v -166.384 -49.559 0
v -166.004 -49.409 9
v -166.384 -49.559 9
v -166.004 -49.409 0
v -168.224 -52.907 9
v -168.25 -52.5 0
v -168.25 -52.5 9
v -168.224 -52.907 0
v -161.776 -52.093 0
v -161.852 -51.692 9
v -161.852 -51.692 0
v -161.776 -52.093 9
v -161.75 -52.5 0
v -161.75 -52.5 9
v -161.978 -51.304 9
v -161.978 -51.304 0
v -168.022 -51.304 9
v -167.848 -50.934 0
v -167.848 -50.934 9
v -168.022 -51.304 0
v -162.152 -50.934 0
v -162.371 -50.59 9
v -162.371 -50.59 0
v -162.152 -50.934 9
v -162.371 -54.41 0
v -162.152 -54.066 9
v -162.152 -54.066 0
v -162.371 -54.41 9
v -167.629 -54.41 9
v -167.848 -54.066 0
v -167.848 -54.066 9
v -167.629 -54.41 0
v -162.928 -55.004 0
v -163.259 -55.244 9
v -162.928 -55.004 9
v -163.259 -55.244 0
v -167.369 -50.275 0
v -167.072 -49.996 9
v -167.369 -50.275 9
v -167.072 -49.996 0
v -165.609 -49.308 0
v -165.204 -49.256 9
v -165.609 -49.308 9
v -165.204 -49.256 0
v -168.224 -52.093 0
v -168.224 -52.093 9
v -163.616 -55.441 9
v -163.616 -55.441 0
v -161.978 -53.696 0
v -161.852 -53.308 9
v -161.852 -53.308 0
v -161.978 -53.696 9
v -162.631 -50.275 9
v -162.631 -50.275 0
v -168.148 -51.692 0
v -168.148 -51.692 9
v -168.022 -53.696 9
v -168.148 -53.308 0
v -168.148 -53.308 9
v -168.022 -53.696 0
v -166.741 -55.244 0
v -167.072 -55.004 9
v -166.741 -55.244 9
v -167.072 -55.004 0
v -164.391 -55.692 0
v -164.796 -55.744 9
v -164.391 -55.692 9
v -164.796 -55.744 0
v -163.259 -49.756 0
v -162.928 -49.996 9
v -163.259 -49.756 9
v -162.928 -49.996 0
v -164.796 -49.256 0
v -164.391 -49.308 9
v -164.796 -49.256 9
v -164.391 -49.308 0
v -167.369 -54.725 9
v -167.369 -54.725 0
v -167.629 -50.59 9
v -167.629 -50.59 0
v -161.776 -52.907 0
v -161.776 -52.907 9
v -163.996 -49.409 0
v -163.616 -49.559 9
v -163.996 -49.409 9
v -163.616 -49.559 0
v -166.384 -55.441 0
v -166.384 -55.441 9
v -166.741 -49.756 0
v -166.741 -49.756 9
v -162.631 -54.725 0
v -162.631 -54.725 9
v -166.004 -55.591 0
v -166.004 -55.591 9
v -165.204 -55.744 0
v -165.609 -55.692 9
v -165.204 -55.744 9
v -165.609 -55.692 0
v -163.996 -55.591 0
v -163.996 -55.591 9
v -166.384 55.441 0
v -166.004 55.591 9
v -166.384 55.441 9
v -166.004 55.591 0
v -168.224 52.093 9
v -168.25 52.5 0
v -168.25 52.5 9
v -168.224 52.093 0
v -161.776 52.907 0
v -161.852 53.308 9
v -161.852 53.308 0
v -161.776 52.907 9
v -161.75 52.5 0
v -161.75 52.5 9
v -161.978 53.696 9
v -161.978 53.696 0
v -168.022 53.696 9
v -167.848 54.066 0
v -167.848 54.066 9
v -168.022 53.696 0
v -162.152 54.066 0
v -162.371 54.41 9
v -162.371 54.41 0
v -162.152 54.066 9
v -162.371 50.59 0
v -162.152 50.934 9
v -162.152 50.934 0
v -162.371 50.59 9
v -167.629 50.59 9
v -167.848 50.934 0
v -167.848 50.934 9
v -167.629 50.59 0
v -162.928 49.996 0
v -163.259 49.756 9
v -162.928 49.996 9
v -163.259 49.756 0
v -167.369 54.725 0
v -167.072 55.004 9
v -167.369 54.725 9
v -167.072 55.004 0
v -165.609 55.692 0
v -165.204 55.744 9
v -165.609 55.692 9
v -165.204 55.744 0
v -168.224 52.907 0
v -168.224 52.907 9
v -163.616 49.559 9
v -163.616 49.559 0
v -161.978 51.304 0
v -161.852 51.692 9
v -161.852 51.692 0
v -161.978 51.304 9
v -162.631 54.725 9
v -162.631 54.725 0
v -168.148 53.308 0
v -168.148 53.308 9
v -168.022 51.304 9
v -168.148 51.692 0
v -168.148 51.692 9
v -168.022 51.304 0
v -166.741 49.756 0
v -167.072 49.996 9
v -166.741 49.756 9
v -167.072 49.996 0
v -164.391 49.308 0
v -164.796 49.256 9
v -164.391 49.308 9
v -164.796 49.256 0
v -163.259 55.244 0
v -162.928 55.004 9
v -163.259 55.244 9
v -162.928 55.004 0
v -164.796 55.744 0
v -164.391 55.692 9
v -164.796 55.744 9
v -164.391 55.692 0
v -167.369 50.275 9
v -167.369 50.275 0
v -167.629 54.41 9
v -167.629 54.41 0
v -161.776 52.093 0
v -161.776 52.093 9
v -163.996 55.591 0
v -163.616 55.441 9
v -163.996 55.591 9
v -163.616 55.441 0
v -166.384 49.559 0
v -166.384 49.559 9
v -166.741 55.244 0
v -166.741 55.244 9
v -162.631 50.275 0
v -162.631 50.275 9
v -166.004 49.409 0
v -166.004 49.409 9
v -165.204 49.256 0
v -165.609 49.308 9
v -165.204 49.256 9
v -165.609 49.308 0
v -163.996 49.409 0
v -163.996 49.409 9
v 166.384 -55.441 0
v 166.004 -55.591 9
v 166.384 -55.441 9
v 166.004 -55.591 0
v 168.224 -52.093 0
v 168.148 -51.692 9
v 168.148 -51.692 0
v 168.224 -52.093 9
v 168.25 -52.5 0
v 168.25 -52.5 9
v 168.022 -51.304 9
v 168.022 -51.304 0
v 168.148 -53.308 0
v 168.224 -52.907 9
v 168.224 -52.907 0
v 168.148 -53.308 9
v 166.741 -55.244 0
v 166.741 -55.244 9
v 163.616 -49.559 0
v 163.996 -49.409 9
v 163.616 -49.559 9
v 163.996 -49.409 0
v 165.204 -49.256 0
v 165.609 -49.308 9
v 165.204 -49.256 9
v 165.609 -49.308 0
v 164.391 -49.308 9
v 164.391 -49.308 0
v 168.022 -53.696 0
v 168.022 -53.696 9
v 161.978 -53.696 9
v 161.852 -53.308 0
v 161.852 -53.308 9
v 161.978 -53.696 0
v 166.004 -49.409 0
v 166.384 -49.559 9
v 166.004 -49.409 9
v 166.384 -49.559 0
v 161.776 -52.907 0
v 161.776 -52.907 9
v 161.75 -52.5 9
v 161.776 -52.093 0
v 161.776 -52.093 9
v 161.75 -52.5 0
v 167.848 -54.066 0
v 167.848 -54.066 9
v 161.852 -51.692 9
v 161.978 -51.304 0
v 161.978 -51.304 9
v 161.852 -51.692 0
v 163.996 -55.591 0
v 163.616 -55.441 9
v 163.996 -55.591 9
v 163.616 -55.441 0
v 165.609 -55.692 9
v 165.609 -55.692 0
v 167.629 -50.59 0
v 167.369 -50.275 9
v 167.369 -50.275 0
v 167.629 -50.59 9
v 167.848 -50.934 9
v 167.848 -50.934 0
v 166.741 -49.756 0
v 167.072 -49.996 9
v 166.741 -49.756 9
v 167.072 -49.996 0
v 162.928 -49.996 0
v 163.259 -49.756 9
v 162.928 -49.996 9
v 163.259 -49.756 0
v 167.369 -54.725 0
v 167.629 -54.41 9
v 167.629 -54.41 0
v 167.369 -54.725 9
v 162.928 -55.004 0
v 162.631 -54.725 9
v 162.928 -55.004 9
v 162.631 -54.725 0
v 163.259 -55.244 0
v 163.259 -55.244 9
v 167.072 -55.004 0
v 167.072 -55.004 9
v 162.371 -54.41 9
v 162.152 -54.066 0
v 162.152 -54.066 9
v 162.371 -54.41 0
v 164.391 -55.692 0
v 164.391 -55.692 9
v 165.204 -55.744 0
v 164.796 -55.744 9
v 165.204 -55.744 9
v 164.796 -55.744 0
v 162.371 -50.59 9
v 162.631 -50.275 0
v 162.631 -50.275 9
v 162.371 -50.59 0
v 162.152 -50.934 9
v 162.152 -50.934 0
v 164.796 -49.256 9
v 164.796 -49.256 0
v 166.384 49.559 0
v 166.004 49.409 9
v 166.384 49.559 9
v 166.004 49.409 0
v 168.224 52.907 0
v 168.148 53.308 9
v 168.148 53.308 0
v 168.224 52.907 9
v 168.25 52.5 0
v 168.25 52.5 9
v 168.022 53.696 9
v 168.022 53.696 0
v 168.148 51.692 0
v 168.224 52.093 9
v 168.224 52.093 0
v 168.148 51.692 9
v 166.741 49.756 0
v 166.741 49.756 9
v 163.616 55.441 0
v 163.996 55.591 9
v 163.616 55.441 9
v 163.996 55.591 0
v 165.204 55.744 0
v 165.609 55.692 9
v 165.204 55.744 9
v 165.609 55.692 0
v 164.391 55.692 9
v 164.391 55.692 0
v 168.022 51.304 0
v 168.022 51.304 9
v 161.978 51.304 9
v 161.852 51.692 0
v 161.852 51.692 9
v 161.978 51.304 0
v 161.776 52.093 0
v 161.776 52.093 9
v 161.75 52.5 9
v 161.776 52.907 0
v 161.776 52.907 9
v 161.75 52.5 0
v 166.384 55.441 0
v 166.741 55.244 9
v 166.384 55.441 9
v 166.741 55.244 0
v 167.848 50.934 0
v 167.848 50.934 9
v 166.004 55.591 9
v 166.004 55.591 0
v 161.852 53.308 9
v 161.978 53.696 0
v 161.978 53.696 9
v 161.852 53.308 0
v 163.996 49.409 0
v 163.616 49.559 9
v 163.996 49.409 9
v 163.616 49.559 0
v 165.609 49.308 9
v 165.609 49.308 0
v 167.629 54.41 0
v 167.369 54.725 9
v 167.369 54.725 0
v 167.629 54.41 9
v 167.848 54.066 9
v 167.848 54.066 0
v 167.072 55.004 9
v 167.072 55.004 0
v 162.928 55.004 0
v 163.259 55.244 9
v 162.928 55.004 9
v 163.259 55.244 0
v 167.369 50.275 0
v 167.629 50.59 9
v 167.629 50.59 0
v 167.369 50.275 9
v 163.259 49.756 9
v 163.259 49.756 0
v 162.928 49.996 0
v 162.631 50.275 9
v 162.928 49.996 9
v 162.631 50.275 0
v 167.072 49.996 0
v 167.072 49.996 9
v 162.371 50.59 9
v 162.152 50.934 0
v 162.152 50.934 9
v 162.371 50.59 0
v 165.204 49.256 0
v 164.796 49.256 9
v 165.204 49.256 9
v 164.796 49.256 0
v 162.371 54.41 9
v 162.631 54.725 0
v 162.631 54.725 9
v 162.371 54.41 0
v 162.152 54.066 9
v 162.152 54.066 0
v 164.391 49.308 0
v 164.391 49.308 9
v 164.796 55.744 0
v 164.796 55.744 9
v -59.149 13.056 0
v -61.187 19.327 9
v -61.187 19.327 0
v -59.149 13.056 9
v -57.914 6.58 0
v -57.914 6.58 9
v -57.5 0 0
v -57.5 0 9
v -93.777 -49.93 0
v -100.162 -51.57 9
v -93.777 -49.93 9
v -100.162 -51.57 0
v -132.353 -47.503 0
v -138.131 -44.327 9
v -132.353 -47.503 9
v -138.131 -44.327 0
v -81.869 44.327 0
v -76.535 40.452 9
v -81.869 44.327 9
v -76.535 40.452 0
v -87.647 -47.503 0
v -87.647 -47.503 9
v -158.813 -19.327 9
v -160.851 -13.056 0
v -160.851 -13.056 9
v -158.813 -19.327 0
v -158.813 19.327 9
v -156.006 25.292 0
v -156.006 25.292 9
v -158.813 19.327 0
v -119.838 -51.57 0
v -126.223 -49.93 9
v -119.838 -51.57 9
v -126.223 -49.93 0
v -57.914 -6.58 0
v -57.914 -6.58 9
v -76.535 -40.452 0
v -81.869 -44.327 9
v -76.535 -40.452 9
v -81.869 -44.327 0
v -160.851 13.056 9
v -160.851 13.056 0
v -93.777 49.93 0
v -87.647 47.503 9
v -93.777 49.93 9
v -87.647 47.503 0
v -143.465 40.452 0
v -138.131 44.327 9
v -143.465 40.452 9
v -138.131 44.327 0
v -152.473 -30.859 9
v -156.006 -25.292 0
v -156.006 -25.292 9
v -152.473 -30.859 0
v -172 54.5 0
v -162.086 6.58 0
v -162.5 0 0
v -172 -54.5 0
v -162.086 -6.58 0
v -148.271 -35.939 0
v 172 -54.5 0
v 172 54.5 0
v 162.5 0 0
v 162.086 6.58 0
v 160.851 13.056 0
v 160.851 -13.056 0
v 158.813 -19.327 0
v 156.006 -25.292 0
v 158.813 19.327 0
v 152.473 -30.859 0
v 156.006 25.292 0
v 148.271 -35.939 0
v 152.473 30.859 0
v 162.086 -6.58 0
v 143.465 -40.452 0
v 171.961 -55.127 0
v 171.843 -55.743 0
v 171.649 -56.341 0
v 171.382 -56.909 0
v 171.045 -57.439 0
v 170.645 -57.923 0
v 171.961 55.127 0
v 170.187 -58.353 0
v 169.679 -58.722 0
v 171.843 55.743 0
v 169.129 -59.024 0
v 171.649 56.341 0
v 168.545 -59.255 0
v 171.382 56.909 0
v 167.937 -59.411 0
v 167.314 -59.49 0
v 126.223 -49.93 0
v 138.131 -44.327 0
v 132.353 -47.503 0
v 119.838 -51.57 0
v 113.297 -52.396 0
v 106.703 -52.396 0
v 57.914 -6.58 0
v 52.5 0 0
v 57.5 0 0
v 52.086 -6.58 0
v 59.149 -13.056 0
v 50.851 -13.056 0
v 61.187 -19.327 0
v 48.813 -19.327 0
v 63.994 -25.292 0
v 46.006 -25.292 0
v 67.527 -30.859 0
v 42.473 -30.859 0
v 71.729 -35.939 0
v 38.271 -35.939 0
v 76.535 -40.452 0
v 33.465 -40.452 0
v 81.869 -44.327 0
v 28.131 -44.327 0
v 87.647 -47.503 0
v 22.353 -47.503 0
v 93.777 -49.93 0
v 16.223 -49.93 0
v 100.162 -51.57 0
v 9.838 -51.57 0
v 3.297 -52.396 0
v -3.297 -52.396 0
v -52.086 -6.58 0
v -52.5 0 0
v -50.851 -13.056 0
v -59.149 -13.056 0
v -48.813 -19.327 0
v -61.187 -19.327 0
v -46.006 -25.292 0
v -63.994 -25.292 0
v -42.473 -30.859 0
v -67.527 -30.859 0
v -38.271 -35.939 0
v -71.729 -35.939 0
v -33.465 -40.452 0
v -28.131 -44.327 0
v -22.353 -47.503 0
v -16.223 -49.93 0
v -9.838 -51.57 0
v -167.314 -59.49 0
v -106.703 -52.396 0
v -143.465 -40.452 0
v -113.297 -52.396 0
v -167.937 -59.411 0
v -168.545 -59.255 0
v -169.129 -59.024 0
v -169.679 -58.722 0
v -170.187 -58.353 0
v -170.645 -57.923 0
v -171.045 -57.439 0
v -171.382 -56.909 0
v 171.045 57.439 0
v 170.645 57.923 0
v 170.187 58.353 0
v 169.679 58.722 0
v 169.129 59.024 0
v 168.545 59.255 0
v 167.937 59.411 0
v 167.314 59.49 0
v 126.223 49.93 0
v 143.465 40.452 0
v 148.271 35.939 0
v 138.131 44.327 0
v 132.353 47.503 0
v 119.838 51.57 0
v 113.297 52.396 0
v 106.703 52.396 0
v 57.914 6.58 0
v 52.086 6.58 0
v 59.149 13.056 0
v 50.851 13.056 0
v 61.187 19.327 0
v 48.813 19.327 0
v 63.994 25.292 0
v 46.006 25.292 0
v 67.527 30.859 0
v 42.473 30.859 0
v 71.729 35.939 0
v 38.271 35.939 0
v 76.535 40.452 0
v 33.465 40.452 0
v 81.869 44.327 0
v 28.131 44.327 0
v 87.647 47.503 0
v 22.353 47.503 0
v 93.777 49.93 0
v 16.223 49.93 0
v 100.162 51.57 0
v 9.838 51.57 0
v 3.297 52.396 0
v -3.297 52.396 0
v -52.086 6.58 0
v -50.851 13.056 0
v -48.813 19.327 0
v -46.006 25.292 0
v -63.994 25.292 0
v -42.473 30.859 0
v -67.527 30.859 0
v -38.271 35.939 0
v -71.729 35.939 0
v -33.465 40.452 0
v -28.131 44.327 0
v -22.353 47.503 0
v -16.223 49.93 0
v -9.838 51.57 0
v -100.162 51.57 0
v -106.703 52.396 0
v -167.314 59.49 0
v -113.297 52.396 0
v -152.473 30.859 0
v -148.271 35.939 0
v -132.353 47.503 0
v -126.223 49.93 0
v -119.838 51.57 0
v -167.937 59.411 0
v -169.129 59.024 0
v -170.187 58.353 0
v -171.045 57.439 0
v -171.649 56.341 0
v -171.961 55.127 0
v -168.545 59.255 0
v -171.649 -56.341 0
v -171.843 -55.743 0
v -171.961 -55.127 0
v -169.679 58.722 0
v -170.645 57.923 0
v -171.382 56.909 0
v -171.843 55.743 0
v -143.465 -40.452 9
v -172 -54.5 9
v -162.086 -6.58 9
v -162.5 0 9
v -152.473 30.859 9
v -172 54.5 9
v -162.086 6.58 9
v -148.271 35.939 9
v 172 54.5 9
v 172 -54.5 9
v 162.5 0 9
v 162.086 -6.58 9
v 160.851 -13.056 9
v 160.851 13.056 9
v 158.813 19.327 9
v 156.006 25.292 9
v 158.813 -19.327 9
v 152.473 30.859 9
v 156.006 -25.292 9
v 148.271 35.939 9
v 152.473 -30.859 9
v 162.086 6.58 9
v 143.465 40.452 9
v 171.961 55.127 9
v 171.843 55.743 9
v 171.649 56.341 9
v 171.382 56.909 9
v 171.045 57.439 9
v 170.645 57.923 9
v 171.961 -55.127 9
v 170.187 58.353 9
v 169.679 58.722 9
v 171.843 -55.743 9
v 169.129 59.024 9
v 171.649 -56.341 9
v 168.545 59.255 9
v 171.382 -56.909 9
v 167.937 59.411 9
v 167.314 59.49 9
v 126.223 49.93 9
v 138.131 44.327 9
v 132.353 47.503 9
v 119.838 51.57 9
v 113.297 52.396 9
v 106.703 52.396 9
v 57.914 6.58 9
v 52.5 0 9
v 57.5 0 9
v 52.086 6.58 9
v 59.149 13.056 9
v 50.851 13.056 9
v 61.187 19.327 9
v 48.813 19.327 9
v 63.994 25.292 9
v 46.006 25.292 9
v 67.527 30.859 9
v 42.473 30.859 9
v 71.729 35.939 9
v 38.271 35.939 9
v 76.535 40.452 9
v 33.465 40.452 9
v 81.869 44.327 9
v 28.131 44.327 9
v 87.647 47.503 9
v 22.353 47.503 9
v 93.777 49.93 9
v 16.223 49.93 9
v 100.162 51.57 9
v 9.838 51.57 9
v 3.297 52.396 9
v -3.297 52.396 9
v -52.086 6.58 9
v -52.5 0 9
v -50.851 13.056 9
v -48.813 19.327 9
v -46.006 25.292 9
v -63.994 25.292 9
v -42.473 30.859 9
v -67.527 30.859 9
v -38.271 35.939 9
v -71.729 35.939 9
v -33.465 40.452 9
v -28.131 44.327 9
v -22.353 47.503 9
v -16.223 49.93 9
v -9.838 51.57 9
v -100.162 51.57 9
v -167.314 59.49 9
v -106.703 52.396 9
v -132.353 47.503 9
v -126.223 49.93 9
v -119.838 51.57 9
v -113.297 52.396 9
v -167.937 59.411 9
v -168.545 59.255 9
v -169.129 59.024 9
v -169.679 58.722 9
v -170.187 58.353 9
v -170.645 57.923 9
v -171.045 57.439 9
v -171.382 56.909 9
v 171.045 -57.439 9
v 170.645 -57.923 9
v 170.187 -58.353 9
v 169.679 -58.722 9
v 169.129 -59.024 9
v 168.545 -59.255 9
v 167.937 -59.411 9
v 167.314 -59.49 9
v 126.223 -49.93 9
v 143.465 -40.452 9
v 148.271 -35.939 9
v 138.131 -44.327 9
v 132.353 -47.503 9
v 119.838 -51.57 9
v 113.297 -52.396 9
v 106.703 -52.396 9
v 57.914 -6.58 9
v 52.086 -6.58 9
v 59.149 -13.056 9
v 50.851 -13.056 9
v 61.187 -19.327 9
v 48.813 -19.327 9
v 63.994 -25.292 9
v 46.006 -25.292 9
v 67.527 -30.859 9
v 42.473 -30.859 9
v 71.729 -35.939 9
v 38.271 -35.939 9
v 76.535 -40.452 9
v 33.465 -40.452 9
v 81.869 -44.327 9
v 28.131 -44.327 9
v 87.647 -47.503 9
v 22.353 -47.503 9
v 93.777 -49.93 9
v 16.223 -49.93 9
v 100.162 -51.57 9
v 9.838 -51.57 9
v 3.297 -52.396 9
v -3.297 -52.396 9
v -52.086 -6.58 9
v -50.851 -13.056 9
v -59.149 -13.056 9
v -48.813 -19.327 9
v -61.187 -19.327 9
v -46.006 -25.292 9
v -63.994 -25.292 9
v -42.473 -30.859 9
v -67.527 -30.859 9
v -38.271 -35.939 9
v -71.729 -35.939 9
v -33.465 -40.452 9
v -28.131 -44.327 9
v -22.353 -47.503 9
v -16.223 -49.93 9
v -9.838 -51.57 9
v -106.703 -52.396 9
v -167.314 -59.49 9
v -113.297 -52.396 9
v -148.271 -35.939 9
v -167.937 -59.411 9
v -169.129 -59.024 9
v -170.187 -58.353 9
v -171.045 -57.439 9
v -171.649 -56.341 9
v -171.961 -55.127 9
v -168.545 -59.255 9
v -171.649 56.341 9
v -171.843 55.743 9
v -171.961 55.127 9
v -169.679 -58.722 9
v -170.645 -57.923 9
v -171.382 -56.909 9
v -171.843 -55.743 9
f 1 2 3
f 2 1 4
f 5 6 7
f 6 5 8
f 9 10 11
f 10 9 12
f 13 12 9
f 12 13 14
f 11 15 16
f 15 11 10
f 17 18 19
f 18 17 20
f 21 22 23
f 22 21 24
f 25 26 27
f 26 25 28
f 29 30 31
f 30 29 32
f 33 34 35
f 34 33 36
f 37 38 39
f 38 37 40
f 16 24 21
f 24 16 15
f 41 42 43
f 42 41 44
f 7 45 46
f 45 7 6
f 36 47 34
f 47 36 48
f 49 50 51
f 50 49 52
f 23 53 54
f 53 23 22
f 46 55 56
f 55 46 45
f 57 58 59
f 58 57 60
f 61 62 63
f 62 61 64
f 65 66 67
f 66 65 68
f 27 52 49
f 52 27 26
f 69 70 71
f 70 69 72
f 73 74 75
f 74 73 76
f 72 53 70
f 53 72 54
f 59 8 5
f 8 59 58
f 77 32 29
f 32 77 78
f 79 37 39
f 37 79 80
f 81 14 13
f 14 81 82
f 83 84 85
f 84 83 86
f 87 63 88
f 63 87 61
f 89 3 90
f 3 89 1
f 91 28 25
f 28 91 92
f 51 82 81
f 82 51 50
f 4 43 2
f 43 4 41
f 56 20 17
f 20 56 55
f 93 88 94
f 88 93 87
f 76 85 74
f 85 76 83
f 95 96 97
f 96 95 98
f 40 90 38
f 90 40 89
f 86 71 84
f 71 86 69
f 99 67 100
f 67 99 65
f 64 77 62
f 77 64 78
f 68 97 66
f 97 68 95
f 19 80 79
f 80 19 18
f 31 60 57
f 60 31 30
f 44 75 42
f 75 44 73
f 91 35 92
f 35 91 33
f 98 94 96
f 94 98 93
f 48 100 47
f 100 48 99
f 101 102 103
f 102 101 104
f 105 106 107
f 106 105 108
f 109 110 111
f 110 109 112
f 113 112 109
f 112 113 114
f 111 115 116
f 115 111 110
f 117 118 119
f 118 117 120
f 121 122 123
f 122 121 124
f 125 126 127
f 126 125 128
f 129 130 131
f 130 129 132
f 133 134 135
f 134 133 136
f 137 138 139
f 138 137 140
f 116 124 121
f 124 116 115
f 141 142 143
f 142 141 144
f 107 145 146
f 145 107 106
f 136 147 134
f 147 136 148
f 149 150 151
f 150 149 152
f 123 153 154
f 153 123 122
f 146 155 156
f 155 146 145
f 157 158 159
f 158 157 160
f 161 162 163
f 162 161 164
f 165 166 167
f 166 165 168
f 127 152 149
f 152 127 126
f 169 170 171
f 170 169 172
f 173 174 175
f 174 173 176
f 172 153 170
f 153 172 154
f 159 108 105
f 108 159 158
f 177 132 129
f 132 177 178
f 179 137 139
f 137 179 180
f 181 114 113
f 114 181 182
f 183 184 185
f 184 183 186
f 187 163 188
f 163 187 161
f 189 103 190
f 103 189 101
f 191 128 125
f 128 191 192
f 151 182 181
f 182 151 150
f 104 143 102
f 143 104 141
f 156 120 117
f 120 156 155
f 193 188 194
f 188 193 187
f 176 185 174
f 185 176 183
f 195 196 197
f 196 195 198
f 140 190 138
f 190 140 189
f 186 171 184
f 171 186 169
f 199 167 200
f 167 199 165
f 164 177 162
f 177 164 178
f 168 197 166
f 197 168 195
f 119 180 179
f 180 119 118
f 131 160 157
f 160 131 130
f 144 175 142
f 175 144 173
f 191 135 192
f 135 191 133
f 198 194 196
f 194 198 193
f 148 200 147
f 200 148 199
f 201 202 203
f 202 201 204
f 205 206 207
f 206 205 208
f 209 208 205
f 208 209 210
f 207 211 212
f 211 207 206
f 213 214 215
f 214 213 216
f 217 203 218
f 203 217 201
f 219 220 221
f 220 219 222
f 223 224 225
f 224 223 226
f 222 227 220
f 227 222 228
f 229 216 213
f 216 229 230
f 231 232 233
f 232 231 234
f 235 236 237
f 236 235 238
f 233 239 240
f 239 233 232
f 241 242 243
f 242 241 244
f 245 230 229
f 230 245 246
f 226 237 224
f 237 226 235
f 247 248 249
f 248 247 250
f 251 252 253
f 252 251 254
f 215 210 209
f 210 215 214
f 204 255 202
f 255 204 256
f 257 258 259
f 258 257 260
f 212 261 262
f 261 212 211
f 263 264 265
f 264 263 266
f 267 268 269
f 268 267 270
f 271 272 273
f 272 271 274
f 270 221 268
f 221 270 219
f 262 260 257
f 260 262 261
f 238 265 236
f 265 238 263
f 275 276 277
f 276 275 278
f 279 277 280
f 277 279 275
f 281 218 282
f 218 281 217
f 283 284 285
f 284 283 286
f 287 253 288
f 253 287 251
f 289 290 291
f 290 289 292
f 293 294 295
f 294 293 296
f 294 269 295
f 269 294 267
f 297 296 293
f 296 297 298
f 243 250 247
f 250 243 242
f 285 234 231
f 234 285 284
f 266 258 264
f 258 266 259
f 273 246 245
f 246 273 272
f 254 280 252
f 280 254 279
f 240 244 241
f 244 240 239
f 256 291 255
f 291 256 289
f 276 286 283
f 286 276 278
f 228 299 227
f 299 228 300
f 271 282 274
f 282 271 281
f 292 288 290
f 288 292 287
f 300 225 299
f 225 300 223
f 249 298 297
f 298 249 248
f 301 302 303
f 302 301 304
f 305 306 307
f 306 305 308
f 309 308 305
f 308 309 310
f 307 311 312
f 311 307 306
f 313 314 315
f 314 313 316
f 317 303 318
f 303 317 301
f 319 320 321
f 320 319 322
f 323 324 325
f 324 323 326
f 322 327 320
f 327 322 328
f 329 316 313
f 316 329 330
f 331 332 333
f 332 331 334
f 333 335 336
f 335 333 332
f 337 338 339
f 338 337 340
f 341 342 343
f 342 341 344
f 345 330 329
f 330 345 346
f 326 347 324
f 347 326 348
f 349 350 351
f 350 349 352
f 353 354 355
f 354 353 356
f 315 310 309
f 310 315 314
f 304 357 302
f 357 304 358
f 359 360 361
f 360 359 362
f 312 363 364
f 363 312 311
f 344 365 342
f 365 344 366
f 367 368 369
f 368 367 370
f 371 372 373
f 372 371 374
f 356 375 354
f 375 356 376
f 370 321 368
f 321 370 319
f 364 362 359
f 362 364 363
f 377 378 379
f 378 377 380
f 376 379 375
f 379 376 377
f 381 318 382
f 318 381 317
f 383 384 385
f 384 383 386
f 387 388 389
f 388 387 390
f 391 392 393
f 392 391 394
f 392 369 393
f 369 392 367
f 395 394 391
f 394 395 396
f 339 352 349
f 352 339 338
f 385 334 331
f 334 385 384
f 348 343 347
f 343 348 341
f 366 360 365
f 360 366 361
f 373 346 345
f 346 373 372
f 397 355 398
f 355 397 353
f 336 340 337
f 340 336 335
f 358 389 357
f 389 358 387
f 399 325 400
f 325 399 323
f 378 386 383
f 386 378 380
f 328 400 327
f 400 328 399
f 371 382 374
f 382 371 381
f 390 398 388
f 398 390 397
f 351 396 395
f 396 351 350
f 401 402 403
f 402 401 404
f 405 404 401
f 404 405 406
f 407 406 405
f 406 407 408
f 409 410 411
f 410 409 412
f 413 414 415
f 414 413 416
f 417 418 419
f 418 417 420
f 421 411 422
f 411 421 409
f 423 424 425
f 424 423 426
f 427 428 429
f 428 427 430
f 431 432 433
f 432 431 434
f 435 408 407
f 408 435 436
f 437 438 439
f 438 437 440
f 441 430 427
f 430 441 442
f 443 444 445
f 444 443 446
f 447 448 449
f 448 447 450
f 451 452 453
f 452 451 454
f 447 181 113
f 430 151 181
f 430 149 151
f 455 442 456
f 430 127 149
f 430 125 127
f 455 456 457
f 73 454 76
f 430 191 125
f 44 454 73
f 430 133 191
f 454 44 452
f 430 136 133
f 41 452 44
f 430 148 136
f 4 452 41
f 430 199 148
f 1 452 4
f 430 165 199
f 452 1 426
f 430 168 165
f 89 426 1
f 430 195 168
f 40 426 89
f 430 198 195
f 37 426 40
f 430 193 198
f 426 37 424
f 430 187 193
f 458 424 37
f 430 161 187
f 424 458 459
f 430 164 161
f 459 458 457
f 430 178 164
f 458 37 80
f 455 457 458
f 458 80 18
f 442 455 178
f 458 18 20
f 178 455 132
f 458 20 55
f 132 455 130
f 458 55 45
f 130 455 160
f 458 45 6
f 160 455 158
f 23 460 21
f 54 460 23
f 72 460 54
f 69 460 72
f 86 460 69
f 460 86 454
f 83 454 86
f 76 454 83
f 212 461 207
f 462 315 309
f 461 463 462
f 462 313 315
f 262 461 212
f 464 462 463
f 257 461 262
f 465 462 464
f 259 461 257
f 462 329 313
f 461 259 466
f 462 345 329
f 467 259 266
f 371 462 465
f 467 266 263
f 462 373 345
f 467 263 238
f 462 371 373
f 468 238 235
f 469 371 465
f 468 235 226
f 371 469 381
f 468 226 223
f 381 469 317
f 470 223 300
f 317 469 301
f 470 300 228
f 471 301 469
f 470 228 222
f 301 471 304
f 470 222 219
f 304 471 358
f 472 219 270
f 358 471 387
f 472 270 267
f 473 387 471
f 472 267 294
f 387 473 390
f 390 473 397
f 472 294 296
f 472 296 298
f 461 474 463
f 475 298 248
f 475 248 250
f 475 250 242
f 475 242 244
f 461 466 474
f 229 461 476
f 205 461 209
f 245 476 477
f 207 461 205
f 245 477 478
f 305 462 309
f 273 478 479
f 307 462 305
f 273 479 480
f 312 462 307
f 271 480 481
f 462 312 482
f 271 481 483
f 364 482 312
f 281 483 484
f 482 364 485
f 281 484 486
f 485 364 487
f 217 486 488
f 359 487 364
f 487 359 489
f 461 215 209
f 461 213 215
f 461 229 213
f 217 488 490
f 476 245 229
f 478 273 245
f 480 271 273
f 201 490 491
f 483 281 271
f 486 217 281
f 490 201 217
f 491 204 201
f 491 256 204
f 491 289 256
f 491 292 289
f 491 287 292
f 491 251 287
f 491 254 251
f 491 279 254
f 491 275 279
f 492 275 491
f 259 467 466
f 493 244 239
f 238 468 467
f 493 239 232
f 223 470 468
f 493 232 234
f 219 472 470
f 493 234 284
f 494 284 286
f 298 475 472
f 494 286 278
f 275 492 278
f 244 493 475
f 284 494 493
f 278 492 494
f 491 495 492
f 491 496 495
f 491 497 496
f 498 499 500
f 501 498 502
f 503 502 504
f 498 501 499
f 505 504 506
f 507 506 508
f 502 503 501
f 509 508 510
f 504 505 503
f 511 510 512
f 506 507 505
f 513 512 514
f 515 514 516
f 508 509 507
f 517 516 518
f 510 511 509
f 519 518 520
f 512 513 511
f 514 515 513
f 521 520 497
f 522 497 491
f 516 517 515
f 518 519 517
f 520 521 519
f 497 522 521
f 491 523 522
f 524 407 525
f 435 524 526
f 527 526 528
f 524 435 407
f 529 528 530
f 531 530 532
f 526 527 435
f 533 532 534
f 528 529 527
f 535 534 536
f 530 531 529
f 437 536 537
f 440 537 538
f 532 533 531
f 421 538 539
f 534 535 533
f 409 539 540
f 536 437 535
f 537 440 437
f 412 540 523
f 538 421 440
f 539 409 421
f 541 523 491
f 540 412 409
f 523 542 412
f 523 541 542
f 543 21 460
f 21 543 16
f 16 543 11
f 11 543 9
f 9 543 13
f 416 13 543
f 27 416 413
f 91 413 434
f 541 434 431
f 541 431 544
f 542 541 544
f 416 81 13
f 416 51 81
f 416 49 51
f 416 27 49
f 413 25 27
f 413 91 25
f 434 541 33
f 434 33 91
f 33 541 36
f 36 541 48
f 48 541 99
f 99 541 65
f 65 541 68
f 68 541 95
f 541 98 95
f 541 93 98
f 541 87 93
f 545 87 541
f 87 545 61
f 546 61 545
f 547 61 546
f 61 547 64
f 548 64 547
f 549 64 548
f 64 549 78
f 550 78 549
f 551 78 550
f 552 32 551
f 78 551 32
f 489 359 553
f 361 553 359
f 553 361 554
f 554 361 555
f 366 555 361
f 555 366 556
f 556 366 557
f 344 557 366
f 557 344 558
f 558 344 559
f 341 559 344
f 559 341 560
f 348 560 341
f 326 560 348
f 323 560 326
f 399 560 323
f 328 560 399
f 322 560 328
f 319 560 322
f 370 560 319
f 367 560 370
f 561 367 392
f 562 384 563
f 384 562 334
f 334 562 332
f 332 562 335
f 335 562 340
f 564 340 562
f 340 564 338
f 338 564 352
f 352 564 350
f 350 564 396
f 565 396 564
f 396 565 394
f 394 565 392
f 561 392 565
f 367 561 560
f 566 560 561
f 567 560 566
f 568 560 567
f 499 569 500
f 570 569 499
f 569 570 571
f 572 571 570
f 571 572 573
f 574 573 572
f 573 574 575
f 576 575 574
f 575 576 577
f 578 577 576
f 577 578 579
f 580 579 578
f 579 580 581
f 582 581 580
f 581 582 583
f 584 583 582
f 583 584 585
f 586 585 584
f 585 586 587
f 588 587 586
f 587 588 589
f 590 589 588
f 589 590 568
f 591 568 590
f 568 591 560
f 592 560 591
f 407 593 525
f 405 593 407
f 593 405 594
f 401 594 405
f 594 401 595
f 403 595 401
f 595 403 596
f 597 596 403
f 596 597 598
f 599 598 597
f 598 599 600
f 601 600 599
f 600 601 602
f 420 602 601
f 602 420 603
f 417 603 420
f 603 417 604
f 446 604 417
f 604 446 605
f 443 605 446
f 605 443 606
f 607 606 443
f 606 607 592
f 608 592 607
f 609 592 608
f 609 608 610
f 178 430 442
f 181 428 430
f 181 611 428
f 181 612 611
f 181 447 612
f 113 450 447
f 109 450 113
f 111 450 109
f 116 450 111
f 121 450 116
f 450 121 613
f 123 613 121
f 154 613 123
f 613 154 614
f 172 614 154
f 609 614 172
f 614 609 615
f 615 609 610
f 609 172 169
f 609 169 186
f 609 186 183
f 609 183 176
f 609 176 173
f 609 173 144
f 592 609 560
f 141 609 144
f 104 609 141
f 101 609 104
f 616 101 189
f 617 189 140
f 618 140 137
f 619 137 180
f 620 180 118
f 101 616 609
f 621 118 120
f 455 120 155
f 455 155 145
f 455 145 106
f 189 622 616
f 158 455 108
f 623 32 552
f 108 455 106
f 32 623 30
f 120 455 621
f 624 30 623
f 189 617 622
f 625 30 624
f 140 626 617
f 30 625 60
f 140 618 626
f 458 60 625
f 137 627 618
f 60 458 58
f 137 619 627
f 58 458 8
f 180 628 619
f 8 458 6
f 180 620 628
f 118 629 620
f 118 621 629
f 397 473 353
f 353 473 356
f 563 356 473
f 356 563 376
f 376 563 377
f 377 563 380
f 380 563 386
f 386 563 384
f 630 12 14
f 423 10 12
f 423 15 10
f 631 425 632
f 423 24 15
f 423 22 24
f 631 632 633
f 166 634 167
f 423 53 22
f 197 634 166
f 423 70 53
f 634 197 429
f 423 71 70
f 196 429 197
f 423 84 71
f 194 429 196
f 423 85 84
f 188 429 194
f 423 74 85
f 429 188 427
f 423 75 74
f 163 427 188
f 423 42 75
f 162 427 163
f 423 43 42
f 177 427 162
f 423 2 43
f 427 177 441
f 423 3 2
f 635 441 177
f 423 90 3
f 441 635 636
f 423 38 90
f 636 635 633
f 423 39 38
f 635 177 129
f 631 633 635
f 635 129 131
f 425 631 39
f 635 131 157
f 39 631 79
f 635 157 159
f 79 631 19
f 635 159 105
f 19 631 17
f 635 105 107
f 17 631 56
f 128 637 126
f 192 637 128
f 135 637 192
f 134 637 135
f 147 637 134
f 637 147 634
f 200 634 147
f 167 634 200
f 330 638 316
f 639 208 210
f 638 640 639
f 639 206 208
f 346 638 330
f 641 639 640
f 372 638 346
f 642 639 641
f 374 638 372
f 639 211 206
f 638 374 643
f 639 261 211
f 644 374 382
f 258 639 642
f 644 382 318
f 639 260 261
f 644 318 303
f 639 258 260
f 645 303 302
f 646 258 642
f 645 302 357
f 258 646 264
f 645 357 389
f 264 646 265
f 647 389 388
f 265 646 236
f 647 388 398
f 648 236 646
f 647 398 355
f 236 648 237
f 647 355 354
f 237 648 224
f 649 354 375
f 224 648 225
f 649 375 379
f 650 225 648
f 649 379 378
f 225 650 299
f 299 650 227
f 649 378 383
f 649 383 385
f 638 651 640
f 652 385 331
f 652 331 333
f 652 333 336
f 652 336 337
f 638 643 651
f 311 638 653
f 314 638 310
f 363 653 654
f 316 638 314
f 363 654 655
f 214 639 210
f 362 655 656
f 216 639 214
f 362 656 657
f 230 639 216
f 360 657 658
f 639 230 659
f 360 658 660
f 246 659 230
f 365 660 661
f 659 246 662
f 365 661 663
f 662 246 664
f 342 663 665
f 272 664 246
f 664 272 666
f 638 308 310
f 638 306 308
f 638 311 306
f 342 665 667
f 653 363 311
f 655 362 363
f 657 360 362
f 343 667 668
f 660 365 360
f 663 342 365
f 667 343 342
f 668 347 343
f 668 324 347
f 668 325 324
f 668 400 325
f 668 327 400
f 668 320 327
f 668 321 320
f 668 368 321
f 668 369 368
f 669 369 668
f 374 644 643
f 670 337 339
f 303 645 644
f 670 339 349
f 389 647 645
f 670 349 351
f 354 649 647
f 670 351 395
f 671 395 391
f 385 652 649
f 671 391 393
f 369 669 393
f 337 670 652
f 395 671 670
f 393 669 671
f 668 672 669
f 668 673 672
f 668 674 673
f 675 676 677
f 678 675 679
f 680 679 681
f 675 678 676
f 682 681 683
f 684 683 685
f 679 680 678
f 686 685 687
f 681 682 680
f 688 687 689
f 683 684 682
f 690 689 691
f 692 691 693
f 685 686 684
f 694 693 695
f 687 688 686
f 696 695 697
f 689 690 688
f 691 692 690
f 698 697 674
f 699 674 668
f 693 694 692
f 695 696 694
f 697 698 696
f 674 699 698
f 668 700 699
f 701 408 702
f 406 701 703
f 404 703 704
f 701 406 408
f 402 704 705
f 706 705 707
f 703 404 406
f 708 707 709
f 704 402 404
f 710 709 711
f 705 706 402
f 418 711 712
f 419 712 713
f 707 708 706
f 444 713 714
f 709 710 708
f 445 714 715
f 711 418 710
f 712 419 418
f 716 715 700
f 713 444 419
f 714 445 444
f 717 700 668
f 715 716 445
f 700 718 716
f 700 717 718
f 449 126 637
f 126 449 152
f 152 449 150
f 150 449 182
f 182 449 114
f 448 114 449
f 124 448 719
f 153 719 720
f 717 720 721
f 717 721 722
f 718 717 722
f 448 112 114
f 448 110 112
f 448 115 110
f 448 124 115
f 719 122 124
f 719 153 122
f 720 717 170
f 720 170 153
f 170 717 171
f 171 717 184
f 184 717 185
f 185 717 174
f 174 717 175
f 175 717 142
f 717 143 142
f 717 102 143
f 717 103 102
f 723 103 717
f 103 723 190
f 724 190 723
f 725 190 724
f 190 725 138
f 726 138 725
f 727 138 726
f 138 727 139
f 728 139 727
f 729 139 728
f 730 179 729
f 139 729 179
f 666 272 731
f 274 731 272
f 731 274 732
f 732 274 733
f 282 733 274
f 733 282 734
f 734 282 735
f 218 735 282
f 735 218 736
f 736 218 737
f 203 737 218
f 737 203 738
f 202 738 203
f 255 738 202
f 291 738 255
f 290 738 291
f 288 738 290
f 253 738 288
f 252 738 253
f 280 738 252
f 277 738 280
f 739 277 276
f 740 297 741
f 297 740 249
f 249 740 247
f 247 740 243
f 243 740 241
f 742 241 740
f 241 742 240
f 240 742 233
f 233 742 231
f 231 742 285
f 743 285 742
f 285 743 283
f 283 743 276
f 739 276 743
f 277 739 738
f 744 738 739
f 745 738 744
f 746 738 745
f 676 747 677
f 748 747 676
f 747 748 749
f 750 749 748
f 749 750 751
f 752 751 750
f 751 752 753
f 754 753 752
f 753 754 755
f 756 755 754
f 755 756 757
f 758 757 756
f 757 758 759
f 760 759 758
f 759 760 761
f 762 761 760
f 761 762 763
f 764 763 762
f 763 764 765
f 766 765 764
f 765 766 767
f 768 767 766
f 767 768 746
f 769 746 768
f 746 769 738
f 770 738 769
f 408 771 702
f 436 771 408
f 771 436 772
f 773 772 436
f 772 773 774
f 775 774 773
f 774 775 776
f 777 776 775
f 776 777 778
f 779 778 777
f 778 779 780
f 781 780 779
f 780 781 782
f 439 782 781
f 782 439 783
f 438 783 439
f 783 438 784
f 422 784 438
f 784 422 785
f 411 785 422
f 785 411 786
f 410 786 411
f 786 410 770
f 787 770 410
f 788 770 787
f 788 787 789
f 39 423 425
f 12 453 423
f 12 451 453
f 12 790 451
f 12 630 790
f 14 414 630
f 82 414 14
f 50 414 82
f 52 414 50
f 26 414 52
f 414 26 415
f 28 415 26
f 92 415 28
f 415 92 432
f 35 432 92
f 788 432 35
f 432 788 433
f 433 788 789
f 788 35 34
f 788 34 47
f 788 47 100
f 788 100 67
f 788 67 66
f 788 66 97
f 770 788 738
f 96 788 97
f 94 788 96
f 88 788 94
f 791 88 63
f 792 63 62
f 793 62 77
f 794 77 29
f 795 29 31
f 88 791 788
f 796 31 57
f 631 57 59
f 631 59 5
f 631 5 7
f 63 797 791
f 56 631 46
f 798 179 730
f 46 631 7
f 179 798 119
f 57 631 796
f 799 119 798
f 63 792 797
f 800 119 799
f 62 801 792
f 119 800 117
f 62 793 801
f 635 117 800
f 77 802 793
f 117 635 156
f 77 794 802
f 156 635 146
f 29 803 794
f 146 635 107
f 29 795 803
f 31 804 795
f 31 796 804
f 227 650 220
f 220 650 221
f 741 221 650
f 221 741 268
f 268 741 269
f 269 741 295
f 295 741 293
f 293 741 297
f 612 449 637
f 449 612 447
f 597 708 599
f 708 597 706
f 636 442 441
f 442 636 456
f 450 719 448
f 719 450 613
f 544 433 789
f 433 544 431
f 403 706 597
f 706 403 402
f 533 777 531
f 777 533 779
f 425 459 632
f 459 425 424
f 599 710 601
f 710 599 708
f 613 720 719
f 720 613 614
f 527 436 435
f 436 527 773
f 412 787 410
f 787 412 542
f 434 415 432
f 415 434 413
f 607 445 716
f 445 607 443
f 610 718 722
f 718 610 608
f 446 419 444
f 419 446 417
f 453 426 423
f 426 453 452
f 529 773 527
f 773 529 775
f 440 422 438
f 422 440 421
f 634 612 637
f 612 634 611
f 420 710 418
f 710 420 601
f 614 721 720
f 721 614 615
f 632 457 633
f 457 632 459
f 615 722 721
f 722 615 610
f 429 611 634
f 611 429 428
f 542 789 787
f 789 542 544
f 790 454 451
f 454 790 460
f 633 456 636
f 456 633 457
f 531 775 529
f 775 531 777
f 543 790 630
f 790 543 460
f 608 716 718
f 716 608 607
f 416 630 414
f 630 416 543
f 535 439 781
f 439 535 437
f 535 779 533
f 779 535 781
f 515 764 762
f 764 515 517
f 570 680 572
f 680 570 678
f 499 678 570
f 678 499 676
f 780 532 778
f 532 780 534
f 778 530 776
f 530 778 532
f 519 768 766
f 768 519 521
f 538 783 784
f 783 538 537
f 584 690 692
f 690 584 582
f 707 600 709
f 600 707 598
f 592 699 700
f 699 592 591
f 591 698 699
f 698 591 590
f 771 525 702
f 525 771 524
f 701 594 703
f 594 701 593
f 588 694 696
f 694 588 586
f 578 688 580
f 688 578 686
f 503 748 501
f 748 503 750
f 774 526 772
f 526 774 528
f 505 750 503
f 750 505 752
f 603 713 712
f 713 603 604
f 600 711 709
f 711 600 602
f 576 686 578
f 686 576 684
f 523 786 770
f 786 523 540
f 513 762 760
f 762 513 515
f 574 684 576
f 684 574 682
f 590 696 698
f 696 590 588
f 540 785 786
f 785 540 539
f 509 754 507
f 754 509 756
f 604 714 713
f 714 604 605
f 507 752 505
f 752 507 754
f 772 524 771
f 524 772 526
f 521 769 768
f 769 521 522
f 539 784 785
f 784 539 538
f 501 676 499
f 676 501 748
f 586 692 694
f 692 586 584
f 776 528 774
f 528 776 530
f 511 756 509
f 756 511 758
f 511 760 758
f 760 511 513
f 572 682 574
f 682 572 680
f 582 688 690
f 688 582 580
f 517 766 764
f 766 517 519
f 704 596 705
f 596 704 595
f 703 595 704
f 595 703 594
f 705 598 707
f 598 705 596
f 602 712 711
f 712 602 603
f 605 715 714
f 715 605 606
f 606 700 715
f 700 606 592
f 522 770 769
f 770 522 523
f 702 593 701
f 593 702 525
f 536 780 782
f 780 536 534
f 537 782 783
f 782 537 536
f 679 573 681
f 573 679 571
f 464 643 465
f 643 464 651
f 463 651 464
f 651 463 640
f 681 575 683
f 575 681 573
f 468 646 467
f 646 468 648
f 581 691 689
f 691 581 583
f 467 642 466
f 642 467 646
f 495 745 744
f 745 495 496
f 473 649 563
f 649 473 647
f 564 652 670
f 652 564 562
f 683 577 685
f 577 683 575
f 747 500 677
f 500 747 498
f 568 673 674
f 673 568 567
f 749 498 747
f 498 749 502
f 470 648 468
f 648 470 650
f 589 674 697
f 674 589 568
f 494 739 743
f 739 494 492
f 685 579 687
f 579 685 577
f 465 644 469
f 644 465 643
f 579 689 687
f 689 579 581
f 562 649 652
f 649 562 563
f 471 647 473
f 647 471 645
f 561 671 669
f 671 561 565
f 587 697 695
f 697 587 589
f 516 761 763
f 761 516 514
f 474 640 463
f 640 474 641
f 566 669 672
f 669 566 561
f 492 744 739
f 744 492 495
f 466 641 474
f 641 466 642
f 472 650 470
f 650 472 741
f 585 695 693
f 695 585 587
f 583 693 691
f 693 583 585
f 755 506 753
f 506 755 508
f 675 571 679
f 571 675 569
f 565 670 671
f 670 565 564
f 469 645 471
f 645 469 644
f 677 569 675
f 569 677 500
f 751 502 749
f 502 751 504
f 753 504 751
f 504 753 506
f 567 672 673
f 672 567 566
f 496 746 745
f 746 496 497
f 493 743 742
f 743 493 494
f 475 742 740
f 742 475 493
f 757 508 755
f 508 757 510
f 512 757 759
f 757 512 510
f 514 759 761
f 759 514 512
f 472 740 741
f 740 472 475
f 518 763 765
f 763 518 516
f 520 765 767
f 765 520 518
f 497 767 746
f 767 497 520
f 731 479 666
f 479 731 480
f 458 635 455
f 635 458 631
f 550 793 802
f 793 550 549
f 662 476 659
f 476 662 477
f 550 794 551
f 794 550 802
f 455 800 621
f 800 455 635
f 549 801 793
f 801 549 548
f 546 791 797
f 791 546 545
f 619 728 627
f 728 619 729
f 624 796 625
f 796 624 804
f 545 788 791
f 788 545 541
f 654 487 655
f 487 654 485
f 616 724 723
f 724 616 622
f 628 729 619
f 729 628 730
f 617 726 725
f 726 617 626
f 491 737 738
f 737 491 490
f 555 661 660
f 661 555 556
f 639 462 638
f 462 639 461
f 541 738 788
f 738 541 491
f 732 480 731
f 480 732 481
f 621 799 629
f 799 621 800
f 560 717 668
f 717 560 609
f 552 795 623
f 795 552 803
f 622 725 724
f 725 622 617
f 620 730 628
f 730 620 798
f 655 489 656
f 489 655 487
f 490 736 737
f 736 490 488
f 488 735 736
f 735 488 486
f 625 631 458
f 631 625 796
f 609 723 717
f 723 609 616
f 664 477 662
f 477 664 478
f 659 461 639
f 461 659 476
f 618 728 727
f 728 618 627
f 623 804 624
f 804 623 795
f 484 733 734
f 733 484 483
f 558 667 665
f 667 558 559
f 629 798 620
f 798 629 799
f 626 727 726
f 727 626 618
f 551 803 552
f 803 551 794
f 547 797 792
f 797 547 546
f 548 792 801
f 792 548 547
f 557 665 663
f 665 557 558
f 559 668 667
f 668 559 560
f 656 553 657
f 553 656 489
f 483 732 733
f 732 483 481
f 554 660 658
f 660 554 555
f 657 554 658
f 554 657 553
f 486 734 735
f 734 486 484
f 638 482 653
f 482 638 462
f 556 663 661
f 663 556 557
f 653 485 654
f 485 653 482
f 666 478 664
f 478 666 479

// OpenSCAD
$fn = 50;


difference() {
	union() {
		hull() {
			translate(v = [-167.0000000000, 54.5000000000, 0]) {
				cylinder(h = 9, r = 5);
			}
			translate(v = [167.0000000000, 54.5000000000, 0]) {
				cylinder(h = 9, r = 5);
			}
			translate(v = [-167.0000000000, -54.5000000000, 0]) {
				cylinder(h = 9, r = 5);
			}
			translate(v = [167.0000000000, -54.5000000000, 0]) {
				cylinder(h = 9, r = 5);
			}
		}
	}
	union() {
		#translate(v = [-165.0000000000, -52.5000000000, -100.0000000000]) {
			cylinder(h = 200, r = 3.2500000000);
		}
		#translate(v = [-165.0000000000, 52.5000000000, -100.0000000000]) {
			cylinder(h = 200, r = 3.2500000000);
		}
		#translate(v = [165.0000000000, -52.5000000000, -100.0000000000]) {
			cylinder(h = 200, r = 3.2500000000);
		}
		#translate(v = [165.0000000000, 52.5000000000, -100.0000000000]) {
			cylinder(h = 200, r = 3.2500000000);
		}
		#translate(v = [-110.0000000000, 0, 0]) {
			cylinder(h = 9, r = 52.5000000000);
		}
		#cylinder(h = 9, r = 52.5000000000);
		#translate(v = [110.0000000000, 0, 0]) {
			cylinder(h = 9, r = 52.5000000000);
		}
	}
}
